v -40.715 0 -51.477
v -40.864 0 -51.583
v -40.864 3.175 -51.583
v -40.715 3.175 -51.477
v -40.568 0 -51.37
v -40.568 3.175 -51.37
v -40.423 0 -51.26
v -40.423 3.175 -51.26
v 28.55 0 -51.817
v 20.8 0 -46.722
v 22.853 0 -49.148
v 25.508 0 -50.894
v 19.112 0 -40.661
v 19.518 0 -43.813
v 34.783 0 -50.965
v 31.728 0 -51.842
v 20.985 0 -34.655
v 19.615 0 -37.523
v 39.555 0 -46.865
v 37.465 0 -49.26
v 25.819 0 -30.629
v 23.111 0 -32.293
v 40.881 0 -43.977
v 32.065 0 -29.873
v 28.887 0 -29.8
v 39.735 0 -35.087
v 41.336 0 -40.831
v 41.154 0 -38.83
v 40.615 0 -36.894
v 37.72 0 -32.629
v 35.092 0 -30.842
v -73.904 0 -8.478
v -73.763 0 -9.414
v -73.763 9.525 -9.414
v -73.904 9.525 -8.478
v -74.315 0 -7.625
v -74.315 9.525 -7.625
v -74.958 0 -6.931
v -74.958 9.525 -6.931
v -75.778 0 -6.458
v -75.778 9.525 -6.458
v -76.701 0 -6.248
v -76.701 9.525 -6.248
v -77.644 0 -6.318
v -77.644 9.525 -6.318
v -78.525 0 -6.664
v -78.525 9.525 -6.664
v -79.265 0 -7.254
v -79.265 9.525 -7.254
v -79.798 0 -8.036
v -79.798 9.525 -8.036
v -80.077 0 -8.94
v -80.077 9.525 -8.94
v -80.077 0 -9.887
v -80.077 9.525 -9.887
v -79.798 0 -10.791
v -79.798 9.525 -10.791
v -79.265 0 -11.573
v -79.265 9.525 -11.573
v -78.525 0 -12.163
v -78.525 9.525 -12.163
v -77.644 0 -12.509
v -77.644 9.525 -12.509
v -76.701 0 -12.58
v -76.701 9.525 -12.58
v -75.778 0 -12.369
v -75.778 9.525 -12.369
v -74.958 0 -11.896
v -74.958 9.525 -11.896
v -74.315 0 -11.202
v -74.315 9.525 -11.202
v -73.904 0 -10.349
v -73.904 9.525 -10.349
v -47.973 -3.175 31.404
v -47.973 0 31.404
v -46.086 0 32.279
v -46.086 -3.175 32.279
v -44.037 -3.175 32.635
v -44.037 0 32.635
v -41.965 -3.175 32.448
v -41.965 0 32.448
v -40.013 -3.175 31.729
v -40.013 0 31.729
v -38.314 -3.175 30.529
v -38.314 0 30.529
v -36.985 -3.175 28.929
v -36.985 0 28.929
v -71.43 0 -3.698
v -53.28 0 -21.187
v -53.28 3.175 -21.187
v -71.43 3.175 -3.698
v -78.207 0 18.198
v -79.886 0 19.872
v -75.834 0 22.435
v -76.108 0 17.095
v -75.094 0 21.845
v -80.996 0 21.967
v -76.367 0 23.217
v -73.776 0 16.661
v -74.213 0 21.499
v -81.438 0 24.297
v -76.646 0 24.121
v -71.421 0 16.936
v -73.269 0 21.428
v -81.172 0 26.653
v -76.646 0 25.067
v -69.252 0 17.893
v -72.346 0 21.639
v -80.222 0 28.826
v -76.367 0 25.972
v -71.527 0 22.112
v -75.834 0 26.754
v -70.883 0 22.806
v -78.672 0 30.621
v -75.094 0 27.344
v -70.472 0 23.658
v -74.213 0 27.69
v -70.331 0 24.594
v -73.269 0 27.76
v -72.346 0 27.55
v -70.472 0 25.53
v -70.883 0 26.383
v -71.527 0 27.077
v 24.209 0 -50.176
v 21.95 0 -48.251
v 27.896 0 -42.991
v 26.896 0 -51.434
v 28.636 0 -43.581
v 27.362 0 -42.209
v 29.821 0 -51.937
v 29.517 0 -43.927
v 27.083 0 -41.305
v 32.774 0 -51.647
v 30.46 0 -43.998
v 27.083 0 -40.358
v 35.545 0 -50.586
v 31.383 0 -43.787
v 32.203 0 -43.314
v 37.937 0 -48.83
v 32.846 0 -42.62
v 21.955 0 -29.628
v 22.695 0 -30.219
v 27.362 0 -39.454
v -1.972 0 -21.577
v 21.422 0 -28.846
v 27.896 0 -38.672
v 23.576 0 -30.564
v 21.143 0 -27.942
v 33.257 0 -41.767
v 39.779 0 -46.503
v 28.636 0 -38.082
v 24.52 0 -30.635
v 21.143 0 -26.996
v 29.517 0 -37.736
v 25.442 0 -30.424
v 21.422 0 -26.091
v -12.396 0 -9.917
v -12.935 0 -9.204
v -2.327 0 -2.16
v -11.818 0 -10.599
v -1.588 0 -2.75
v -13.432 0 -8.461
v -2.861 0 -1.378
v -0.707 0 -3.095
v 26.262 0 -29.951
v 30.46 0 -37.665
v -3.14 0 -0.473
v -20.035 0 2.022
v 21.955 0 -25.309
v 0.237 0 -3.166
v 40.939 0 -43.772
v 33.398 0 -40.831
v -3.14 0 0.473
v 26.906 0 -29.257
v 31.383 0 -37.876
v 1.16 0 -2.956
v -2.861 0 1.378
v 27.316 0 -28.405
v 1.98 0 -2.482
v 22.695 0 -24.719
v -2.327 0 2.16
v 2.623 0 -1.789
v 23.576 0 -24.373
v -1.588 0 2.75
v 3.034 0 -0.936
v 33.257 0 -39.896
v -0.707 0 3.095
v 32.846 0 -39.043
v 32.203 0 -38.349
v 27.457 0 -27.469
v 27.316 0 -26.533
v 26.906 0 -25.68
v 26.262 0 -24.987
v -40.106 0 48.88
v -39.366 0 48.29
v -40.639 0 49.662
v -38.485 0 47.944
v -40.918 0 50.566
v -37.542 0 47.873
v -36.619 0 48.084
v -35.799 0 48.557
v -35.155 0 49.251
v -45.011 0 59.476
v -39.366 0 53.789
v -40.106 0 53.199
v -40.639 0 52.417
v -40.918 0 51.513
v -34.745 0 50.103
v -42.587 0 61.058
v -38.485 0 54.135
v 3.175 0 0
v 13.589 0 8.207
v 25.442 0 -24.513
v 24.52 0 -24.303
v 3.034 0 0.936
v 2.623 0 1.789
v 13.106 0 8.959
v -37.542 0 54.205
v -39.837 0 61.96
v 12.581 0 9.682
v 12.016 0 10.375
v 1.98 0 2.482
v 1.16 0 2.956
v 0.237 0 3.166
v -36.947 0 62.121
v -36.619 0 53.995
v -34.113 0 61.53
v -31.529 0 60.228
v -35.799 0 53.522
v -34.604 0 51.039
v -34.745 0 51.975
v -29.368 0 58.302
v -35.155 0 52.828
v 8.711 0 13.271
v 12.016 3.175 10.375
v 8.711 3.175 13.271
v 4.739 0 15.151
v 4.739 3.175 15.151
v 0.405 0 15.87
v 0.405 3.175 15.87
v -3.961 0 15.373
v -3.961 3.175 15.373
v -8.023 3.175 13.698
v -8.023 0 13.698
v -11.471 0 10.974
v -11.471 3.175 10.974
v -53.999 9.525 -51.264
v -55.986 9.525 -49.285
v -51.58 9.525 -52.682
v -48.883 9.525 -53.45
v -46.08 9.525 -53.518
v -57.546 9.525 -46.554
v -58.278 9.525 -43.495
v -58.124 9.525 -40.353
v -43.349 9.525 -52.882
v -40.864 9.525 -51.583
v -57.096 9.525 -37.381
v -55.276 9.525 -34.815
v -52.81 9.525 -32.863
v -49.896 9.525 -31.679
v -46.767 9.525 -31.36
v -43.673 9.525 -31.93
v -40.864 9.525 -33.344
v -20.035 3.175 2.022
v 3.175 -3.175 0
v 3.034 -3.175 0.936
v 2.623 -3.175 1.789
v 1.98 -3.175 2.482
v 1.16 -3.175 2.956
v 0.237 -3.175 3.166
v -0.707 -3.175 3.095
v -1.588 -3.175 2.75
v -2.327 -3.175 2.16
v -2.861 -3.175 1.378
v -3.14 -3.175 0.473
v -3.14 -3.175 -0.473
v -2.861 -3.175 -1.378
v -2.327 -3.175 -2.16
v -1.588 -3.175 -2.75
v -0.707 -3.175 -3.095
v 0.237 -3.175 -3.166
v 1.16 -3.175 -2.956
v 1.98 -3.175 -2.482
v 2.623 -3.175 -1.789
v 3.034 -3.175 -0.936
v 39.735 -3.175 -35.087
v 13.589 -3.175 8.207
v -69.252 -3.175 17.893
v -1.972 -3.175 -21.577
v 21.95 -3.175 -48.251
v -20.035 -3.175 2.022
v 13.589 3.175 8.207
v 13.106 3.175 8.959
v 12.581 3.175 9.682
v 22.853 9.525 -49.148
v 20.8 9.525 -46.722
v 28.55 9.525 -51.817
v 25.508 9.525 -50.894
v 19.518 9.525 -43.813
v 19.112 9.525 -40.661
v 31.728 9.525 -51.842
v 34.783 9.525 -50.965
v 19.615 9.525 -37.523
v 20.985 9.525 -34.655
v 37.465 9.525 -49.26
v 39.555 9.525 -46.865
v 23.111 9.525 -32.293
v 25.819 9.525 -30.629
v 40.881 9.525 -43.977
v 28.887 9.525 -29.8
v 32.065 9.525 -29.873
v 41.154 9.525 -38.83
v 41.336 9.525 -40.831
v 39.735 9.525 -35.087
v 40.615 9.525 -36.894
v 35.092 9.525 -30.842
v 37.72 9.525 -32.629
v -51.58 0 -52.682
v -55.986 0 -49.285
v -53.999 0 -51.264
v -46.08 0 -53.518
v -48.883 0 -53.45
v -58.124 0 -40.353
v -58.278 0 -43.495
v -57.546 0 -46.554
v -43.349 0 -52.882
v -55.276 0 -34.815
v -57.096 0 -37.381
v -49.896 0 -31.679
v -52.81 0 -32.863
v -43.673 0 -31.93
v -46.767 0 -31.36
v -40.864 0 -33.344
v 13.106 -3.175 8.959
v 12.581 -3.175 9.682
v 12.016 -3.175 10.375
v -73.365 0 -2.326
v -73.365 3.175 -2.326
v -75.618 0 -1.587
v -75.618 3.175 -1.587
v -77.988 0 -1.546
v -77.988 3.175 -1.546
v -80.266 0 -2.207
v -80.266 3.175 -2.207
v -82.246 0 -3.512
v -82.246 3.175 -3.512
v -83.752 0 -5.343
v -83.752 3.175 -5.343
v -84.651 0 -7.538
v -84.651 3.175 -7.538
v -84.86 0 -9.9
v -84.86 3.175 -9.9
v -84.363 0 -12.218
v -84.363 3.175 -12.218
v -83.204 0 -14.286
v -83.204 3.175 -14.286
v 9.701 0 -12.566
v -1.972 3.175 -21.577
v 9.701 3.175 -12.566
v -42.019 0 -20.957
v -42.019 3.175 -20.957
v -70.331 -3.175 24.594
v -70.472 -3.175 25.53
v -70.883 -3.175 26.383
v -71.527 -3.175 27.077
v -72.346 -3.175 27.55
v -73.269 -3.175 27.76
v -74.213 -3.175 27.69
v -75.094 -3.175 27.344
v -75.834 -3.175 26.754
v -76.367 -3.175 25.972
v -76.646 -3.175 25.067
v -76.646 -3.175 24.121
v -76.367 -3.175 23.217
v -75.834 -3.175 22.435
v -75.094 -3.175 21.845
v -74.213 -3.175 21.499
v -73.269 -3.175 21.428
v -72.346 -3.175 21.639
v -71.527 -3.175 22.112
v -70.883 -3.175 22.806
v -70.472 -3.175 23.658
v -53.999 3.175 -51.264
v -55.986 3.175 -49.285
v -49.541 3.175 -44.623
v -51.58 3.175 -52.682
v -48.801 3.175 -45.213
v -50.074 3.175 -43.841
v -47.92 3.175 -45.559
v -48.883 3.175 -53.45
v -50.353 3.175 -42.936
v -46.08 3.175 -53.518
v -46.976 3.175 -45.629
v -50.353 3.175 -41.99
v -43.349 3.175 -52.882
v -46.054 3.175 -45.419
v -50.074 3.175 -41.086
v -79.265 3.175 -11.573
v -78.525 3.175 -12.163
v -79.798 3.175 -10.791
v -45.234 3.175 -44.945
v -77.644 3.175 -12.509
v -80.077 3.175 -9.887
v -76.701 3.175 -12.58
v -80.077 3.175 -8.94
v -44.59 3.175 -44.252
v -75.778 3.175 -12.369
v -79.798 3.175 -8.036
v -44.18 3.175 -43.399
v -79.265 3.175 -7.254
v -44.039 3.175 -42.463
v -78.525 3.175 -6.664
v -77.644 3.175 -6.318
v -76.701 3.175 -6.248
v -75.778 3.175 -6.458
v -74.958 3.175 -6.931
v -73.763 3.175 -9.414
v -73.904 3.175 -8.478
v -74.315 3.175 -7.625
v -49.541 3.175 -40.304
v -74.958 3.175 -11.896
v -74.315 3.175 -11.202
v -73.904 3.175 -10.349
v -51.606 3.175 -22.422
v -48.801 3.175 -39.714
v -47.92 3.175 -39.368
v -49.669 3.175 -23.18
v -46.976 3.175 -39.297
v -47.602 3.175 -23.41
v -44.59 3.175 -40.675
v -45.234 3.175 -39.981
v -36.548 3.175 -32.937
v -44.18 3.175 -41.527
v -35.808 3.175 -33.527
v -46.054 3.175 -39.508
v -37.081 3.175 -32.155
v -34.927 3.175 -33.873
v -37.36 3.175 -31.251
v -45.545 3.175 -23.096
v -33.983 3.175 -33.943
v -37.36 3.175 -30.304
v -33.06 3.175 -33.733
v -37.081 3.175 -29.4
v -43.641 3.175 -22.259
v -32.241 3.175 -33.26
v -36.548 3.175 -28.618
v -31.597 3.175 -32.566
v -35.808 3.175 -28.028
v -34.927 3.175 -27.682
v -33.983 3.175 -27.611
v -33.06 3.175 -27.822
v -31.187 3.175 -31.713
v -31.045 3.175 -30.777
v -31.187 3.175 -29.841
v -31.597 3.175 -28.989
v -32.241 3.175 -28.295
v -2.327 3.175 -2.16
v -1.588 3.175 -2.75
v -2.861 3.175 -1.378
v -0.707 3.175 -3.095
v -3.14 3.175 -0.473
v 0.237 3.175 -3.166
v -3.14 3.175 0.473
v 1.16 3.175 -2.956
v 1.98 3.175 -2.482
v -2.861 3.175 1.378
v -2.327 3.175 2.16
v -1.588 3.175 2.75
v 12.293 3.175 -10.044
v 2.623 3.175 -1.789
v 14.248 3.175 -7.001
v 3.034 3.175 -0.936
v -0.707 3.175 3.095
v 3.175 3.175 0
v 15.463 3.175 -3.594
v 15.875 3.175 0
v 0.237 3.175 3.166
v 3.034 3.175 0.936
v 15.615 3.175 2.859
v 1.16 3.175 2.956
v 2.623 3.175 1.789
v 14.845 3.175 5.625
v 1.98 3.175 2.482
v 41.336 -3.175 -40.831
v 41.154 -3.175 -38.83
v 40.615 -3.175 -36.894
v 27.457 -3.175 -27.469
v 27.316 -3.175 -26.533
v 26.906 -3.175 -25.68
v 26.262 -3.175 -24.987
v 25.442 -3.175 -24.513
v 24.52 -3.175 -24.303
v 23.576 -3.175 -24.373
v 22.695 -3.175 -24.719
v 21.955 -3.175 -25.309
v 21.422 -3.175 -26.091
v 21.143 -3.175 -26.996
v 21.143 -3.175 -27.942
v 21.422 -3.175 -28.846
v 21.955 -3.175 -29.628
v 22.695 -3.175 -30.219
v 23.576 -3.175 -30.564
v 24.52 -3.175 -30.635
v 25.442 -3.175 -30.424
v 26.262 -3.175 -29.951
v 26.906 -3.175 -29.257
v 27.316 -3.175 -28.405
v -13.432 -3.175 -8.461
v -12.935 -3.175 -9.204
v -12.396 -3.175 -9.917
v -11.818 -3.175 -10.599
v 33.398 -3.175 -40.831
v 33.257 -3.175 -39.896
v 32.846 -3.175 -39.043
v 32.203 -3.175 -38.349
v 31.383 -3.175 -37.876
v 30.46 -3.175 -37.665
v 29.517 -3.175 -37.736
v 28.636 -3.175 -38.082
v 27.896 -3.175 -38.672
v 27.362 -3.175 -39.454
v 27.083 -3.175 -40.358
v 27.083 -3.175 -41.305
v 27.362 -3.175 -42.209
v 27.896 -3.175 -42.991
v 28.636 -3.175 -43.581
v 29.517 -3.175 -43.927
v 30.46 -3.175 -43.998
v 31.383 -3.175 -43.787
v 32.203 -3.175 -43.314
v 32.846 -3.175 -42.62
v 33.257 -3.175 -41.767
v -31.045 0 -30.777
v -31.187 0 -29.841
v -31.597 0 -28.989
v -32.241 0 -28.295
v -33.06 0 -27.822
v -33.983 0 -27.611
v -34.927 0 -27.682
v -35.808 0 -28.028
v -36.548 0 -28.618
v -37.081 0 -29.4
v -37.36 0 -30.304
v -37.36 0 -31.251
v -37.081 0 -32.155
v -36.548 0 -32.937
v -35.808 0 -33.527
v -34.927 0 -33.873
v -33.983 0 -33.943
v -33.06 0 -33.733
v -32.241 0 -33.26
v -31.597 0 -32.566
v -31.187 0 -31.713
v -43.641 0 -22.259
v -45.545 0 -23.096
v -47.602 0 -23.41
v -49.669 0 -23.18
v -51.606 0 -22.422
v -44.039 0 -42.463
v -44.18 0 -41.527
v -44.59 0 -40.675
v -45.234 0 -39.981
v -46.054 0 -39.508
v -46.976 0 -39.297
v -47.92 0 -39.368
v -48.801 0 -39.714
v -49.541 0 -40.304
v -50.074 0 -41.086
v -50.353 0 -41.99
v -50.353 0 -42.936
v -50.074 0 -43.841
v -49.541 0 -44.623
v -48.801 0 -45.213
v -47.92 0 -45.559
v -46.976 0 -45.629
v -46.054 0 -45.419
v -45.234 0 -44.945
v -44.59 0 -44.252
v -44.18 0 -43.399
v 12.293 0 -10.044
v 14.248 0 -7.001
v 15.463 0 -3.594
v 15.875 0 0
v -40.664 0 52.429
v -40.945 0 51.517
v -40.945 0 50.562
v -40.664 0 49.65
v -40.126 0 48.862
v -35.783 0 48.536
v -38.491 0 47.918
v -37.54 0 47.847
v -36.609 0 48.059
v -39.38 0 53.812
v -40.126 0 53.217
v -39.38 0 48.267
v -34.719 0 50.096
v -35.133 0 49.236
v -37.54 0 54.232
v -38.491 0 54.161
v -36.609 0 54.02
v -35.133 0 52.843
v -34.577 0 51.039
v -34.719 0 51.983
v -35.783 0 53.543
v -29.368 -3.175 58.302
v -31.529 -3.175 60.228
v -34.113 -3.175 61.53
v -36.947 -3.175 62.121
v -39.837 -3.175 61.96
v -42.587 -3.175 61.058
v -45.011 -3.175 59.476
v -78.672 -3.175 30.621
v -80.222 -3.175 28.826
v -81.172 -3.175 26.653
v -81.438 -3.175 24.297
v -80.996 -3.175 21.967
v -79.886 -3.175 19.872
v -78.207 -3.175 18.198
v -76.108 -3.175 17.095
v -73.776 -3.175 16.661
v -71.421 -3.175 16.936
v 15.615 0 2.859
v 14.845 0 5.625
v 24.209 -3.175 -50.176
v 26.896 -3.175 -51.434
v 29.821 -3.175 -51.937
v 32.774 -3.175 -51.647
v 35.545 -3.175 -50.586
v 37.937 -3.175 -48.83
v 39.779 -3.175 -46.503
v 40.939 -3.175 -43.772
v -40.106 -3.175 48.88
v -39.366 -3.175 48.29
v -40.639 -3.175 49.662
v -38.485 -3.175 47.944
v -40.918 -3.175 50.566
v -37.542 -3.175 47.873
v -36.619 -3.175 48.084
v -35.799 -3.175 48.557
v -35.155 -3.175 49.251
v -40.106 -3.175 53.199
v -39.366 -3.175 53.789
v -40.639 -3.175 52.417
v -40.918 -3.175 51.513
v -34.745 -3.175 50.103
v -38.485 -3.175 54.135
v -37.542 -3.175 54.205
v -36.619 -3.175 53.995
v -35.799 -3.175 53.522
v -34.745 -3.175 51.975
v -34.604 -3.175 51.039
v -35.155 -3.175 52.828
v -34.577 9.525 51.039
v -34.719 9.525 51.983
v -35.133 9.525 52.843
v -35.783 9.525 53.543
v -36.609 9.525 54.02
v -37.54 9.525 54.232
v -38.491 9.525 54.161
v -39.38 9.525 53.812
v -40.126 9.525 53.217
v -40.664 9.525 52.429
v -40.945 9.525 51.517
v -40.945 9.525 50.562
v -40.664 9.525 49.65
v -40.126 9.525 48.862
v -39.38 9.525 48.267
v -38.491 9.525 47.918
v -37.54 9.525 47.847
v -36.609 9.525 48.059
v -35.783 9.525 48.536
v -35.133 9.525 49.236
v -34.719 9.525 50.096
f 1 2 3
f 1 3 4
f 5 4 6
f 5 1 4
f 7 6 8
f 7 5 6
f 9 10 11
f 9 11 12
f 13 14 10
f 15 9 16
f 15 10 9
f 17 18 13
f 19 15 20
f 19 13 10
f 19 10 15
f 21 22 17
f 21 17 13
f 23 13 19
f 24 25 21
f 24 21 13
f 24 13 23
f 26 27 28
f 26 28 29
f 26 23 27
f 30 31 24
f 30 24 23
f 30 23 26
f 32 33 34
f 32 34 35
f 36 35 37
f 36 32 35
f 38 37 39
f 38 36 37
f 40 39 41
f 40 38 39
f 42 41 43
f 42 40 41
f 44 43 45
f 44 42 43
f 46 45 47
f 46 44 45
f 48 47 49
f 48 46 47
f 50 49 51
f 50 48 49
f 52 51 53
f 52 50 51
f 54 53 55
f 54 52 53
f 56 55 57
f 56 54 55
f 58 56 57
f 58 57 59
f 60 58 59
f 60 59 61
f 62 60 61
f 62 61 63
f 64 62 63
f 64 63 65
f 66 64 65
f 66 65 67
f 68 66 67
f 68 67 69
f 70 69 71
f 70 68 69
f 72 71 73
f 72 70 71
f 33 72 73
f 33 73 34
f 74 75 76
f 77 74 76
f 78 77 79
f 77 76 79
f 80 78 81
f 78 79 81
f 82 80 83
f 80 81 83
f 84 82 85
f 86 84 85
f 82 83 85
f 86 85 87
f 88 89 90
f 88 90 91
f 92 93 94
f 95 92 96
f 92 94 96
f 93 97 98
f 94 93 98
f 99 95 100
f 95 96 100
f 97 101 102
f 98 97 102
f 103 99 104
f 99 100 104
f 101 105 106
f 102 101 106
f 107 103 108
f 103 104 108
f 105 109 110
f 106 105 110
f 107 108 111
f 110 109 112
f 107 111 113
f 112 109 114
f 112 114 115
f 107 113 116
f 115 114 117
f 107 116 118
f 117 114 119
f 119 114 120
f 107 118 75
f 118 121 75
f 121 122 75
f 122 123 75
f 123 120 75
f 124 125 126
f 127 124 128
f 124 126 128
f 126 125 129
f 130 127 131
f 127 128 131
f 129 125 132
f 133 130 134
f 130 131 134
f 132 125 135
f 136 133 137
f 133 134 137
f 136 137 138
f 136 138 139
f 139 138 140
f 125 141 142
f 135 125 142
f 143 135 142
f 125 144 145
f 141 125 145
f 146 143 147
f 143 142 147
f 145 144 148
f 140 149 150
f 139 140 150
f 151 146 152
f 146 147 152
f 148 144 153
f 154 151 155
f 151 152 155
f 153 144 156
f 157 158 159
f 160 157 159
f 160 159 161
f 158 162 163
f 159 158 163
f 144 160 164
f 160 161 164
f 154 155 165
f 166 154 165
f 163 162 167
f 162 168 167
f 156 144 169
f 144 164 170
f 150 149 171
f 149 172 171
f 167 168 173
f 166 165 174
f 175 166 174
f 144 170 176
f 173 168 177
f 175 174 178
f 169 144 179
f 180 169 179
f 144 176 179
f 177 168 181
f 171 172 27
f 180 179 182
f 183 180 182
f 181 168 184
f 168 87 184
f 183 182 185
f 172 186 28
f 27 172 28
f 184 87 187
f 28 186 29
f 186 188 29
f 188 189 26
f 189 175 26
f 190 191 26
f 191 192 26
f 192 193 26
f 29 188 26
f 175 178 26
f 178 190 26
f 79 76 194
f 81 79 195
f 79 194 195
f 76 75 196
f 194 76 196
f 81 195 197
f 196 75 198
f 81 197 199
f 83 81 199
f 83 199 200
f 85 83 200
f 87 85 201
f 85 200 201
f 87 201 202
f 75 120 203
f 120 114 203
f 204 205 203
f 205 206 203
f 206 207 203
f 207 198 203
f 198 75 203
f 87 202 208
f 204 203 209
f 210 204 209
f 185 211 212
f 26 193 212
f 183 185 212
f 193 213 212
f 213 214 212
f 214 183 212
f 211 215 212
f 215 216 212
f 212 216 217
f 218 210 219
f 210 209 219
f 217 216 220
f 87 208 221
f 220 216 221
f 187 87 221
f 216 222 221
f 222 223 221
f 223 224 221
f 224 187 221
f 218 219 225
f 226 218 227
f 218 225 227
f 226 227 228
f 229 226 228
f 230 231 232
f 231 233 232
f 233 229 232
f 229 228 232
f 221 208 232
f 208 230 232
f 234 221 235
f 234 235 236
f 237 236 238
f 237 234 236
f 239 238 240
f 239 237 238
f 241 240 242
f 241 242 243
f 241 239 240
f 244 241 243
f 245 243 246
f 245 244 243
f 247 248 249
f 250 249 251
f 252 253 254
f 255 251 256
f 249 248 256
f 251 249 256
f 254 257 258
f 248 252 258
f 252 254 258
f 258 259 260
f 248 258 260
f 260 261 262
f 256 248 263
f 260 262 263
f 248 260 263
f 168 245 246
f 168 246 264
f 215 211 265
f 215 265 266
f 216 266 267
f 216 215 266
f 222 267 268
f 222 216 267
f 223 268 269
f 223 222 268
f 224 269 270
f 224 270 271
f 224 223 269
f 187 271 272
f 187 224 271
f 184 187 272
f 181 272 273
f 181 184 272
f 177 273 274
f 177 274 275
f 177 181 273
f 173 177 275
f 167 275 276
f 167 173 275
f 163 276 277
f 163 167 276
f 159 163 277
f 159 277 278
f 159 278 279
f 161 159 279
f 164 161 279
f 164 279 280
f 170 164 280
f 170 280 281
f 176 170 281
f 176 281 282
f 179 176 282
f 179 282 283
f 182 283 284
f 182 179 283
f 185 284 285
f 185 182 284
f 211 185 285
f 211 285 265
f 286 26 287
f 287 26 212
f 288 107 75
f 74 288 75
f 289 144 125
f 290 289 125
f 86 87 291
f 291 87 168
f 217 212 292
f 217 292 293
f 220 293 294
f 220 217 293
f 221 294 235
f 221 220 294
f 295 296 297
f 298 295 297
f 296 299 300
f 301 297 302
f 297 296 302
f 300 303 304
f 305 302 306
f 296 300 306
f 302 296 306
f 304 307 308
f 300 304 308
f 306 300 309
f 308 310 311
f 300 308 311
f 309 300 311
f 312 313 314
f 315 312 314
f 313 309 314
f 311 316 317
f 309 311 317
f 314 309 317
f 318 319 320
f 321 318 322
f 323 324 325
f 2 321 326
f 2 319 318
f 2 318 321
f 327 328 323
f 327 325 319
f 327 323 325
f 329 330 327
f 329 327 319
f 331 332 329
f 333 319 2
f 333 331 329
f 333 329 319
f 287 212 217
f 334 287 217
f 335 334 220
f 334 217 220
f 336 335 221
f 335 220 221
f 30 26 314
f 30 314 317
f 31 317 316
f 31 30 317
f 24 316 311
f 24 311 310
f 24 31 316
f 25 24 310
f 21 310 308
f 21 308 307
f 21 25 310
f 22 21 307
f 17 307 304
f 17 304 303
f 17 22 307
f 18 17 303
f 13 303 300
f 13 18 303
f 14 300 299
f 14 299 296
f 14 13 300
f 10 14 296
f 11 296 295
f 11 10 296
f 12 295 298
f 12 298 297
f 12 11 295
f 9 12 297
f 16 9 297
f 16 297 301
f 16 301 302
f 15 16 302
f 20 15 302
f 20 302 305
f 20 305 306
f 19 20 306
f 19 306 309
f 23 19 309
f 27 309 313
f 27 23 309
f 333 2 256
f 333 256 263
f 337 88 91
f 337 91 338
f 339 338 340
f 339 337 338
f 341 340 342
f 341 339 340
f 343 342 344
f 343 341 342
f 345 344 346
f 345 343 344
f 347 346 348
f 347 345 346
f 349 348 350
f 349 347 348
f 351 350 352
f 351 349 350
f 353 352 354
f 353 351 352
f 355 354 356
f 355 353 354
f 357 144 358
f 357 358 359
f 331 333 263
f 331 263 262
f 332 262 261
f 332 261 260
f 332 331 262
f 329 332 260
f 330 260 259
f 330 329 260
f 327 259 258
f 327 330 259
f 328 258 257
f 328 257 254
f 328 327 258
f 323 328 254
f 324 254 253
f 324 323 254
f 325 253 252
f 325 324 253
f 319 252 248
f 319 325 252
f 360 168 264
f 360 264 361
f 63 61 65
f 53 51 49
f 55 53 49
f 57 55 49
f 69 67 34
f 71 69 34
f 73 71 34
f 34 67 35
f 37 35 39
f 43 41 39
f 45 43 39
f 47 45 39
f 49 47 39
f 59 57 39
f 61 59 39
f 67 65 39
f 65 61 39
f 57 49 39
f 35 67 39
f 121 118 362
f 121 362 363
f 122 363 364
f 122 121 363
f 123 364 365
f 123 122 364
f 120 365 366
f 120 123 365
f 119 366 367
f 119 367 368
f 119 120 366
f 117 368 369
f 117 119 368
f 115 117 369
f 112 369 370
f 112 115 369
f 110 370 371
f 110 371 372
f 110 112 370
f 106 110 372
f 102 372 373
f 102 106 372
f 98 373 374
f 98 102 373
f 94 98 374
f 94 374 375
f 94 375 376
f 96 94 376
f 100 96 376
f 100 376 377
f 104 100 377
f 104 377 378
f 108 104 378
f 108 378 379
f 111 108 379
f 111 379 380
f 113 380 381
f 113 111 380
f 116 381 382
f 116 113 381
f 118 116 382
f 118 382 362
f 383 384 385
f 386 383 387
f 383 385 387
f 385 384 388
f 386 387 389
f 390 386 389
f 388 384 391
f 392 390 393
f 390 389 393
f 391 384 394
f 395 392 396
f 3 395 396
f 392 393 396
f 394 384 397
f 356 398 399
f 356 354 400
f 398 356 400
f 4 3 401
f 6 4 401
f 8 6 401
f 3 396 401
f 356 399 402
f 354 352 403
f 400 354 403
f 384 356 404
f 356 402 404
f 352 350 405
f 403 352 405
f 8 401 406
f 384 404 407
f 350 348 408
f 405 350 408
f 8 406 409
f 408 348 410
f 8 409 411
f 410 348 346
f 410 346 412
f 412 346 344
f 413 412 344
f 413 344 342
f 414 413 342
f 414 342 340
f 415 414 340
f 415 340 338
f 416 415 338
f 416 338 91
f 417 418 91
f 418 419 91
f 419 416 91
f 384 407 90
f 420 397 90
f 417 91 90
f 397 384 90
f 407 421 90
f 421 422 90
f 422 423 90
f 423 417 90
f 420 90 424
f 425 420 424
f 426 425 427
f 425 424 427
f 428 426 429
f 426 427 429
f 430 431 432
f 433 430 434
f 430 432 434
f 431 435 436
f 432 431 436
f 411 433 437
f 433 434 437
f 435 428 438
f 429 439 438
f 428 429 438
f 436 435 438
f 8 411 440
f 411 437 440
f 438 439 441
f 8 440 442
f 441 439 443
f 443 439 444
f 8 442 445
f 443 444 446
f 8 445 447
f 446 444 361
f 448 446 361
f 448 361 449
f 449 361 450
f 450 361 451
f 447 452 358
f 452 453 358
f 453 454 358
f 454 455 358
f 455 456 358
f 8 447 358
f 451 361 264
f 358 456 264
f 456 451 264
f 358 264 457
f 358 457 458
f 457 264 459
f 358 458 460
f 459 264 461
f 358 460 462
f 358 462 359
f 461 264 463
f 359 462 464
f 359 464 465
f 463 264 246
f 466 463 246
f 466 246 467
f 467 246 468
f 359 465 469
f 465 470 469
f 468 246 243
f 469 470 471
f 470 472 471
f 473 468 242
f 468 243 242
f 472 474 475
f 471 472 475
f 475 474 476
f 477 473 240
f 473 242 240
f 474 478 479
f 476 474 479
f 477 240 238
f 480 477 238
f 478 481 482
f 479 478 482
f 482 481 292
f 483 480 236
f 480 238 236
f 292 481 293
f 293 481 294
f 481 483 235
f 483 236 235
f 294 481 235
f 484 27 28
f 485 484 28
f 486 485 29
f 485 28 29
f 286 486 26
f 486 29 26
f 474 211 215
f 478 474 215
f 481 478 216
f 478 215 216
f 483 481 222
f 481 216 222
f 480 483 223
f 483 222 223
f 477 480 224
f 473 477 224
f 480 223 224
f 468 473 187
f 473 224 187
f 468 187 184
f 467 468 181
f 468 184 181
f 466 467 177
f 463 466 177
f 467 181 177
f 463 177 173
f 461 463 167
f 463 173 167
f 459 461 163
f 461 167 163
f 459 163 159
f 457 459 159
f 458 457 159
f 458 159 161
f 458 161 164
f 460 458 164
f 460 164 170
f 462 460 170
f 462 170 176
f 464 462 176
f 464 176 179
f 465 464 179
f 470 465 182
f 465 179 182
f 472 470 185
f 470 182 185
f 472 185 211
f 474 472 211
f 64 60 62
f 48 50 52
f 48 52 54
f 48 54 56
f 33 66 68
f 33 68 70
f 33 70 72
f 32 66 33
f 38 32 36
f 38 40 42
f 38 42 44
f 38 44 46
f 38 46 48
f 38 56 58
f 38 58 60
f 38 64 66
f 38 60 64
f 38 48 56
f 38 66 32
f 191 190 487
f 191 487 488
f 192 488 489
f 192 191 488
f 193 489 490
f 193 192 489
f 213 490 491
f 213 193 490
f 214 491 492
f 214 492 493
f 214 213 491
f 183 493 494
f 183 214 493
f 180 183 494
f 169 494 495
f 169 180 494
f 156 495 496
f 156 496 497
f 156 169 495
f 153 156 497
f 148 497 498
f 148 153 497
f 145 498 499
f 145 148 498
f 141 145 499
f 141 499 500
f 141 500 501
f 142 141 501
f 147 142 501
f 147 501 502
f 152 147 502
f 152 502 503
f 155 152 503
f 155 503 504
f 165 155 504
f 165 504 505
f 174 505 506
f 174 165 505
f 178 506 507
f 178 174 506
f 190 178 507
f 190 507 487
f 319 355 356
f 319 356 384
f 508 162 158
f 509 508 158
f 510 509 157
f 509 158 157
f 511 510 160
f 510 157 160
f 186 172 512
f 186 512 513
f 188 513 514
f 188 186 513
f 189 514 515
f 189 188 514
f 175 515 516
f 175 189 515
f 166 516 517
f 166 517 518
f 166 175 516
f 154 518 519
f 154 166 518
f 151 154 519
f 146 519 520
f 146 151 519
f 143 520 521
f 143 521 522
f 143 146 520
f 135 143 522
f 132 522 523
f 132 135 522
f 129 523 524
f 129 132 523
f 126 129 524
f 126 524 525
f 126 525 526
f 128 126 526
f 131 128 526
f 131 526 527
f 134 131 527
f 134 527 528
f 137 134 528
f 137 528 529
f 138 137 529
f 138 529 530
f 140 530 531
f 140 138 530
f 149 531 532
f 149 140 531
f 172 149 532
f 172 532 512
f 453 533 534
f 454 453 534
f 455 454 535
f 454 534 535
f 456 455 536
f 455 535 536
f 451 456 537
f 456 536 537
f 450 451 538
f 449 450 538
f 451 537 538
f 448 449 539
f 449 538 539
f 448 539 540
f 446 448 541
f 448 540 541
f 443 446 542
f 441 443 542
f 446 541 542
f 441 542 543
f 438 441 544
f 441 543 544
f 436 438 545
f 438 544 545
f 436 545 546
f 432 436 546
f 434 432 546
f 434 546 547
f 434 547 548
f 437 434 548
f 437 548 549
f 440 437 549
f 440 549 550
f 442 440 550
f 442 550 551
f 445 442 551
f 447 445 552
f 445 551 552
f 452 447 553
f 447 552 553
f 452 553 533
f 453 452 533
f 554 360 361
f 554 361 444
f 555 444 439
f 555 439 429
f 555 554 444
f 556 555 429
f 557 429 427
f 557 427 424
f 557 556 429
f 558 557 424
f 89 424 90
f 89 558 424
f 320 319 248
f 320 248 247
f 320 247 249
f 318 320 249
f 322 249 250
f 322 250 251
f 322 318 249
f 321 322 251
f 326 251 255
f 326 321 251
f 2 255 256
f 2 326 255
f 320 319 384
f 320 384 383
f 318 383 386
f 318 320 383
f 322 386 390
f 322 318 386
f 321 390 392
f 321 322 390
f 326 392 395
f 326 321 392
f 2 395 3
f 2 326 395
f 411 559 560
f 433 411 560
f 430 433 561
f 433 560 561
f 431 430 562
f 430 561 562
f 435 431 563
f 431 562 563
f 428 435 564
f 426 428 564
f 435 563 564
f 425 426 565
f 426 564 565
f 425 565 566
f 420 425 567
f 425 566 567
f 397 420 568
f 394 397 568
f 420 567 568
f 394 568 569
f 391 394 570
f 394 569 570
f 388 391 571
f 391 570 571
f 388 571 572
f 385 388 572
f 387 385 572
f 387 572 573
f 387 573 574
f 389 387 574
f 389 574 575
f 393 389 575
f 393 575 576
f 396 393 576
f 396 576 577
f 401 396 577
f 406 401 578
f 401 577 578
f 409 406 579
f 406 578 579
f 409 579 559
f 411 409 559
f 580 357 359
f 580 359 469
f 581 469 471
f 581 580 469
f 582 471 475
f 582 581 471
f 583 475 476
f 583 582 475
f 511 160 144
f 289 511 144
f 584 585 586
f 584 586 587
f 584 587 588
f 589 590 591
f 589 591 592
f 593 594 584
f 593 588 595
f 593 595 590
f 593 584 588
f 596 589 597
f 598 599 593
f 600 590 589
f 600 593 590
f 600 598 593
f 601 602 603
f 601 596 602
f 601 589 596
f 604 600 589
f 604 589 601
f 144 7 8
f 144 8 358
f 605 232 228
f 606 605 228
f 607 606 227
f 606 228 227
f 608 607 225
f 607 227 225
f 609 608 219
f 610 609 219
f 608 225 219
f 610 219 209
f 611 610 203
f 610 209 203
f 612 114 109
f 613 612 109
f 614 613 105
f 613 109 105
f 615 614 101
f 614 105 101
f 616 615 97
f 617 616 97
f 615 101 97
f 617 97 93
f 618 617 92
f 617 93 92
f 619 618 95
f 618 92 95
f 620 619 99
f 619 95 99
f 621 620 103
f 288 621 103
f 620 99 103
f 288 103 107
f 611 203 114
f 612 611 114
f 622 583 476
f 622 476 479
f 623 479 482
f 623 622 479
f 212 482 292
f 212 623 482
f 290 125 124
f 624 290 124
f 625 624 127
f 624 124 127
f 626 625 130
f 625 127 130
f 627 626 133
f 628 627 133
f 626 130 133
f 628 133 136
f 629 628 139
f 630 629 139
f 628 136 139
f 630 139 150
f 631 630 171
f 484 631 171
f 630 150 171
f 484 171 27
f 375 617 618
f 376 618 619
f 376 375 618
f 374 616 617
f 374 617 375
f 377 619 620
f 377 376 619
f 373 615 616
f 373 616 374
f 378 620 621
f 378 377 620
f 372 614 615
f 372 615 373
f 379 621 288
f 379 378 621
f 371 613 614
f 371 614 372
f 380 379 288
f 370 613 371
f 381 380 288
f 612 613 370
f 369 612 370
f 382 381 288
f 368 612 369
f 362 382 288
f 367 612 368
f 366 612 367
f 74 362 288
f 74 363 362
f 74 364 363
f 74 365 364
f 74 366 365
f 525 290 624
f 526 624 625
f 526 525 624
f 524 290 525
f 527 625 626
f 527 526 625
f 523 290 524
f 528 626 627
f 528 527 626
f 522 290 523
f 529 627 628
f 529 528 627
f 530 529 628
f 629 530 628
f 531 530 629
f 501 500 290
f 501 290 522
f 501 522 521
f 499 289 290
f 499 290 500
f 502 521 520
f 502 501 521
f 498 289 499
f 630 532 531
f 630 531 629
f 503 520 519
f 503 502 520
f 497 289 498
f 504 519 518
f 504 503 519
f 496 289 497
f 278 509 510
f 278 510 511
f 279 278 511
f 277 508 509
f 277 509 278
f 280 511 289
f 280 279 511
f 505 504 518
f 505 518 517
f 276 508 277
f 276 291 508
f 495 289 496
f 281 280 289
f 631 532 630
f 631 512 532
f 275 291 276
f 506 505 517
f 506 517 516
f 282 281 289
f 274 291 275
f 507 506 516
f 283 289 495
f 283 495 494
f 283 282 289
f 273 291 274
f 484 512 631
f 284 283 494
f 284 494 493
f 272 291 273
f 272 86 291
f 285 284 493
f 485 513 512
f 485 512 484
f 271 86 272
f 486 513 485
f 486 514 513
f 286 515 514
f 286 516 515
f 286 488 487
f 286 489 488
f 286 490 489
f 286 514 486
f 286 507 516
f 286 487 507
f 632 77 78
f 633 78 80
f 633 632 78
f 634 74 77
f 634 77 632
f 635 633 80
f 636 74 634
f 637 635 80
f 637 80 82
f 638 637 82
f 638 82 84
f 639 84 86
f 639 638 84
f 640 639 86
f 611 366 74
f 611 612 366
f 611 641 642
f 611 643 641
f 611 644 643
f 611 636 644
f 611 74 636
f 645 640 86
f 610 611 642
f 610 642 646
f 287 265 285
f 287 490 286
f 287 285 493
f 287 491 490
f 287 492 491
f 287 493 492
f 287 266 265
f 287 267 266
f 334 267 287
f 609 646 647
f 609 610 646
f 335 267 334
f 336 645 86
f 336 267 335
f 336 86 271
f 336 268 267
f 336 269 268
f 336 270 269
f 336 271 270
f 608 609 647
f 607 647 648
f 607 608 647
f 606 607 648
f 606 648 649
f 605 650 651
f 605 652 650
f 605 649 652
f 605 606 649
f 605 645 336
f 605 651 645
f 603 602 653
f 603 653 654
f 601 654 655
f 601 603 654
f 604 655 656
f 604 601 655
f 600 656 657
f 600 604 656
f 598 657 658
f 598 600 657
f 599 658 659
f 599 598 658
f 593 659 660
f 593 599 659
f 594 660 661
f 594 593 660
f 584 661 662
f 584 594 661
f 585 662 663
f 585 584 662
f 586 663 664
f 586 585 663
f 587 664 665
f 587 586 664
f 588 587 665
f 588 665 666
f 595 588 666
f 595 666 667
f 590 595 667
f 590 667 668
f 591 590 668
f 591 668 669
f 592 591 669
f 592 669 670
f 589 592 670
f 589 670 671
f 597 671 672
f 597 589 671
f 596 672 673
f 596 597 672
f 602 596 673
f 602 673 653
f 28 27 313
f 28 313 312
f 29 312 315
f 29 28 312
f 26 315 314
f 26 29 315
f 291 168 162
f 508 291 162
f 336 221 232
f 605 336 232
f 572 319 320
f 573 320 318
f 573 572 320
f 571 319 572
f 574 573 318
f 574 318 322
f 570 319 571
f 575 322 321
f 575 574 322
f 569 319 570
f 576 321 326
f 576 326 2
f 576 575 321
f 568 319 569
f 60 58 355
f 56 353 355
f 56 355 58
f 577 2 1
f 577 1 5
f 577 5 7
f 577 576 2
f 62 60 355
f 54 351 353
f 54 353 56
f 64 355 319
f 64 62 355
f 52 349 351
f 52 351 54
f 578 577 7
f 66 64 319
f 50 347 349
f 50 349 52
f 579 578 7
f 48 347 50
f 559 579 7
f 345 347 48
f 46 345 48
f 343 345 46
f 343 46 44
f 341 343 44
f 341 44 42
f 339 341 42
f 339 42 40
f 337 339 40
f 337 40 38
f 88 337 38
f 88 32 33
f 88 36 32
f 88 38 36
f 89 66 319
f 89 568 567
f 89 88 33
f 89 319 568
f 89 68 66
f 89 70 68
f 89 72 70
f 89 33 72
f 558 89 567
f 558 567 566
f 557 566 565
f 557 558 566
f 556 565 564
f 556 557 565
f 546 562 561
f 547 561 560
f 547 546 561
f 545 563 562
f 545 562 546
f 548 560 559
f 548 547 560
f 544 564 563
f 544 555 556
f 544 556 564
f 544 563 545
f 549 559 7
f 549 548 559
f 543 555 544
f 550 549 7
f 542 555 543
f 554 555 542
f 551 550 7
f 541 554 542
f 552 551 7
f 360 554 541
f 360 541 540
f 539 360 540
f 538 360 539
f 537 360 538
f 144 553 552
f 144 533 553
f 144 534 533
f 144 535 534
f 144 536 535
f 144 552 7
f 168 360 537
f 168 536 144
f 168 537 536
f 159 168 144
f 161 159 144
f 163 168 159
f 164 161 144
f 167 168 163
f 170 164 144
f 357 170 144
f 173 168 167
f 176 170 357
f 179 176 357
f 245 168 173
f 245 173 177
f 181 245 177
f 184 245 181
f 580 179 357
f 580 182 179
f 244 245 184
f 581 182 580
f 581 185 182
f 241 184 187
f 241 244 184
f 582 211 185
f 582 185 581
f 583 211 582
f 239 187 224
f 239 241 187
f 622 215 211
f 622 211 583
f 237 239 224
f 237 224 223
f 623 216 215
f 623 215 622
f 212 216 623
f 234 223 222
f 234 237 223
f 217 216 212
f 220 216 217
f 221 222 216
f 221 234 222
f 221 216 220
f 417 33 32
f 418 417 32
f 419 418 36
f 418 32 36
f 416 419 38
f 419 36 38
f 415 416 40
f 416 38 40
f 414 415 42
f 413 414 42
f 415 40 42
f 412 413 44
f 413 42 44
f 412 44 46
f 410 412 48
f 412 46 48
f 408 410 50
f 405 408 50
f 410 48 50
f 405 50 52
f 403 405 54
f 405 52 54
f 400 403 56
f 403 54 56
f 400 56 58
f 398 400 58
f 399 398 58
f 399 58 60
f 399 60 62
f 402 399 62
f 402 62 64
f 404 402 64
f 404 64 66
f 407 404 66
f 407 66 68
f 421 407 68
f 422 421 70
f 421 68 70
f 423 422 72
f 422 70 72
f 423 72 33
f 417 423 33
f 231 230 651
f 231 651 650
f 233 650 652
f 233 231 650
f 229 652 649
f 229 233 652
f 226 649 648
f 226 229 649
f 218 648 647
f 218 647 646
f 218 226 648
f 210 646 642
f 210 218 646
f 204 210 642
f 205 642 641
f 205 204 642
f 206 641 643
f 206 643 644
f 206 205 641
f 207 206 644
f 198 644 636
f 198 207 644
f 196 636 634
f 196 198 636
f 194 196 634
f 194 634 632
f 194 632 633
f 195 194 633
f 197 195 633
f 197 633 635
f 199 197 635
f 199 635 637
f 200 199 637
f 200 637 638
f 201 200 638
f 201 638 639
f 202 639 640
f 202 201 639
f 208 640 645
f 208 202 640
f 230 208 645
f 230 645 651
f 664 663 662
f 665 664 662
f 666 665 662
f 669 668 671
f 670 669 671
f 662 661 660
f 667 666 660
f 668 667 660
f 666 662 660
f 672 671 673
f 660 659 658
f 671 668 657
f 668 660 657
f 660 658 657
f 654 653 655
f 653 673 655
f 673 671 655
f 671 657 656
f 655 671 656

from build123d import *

# Parameters (mm, degrees)
F0_R     = 3.175
F1_DEPTH = 3.175
F2_DEPTH = 3.175
F3_DEPTH = 3.175
F6_DEPTH = 9.525
F5_R     = 3.2017905818
F7_DEPTH = 9.525


with BuildPart() as f1:
    # F0 (on Front) → F1 (new body)
    with BuildSketch(Plane.XZ):
        with BuildLine():
            ThreePointArc((9.7006393072, -12.5663527737), (14.2480397599, -7.0006419705), (15.875, 0))
            ThreePointArc((15.875, 0), (15.2928451858, 4.2596374402), (13.589077339, 8.2068631081))
            ThreePointArc((13.589077339, 8.2068631081), (12.8481306417, 9.3242245797), (12.0155447944, 10.3750811223))
            ThreePointArc((12.0155447944, 10.3750811223), (0.4046753915, 15.8698412981), (-11.4711511247, 10.9739836374))
            ThreePointArc((-11.4711511247, 10.9739836374), (-15.7947937715, 1.5937737343), (-13.4322489239, -8.461105947))
            ThreePointArc((-13.4322489239, -8.461105947), (-12.6704088261, -9.5643277432), (-11.818197177, -10.5993320773))
            ThreePointArc((-11.818197177, -10.5993320773), (-1.4450970341, -15.8090897765), (9.7006393072, -12.5663527737))
        make_face()
        Circle(F0_R, mode=Mode.SUBTRACT)
        with BuildLine():
            Line((-1.9723715397, -21.5773737034), (9.7006393072, -12.5663527737))
            ThreePointArc((9.7006393072, -12.5663527737), (-1.4450970341, -15.8090897765), (-11.818197177, -10.5993320773))
            Line((-11.818197177, -10.5993320773), (-1.9723715397, -21.5773737034))
        make_face()
        with BuildLine():
            Line((-1.9723715397, -21.5773737034), (-11.818197177, -10.5993320773))
            ThreePointArc((-11.818197177, -10.5993320773), (-12.6704088261, -9.5643277432), (-13.4322489239, -8.461105947))
            Line((-13.4322489239, -8.461105947), (-20.0354577926, 2.0216779558))
            Line((-20.0354577926, 2.0216779558), (-42.0186206254, -20.9574143581))
            ThreePointArc((-42.0186206254, -20.9574143581), (-47.601548398, -23.4101962273), (-53.2796810271, -21.1866784606))
            Line((-53.2796810271, -21.1866784606), (-71.4303764219, -3.6977333553))
            ThreePointArc((-71.4303764219, -3.6977333553), (-69.6330912018, -6.308131344), (-69.0003723469, -9.4136230398))
            ThreePointArc((-69.0003723469, -9.4136230398), (-74.3620830362, -16.921566545), (-83.2036392891, -14.2864118589))
            Line((-83.2036392891, -14.2864118589), (-55.9857223186, -49.2850811473))
            ThreePointArc((-55.9857223186, -49.2850811473), (-55.2758223722, -34.8153662876), (-40.8636484691, -33.3436837668))
            ThreePointArc((-40.8636484691, -33.3436837668), (-37.3634700126, -37.3190890389), (-36.1011484691, -42.4631769682))
            ThreePointArc((-36.1011484691, -42.4631769682), (-37.2400206372, -47.3636263476), (-40.4232009541, -51.2596239098))
            Line((-40.4232009541, -51.2596239098), (-1.9723715397, -21.5773737034))
        make_face()
        with Locations((-34.2204524104, -30.7773106666)):
            Circle(F0_R, mode=Mode.SUBTRACT)
        with BuildLine():
            ThreePointArc((-13.4322489239, -8.461105947), (-15.7947937715, 1.5937737343), (-11.4711511247, 10.9739836374))
            Line((-11.4711511247, 10.9739836374), (-20.0354577926, 2.0216779558))
            Line((-20.0354577926, 2.0216779558), (-13.4322489239, -8.461105947))
        make_face()
        with BuildLine():
            ThreePointArc((-55.9857223186, -49.2850811473), (-48.882881605, -53.4495920791), (-40.8636484691, -51.5826701696))
            Line((-40.8636484691, -51.5826701696), (-40.8636484691, -33.3436837668))
            ThreePointArc((-40.8636484691, -33.3436837668), (-55.2758223722, -34.8153662876), (-55.9857223186, -49.2850811473))
        make_face()
        with Locations((-47.2136484691, -42.4631769682)):
            Circle(F0_R, mode=Mode.SUBTRACT)
        with BuildLine():
            ThreePointArc((-71.4303764219, -3.6977333553), (-82.2457694679, -3.5119169812), (-83.2036392891, -14.2864118589))
            ThreePointArc((-83.2036392891, -14.2864118589), (-74.3620830362, -16.921566545), (-69.0003723469, -9.4136230398))
            ThreePointArc((-69.0003723469, -9.4136230398), (-69.6330912018, -6.308131344), (-71.4303764219, -3.6977333553))
        make_face()
        with Locations((-76.9378723469, -9.4136230398)):
            Circle(F0_R, mode=Mode.SUBTRACT)
    extrude(amount=-F1_DEPTH)

    # F0 (on Front) → F3 (join)
    with BuildSketch(Plane.XZ):
        with BuildLine():
            ThreePointArc((-40.8636484691, -51.5826701696), (-40.64143956, -51.4238536338), (-40.4232009541, -51.2596239098))
            ThreePointArc((-40.4232009541, -51.2596239098), (-37.2400206372, -47.3636263476), (-36.1011484691, -42.4631769682))
            ThreePointArc((-36.1011484691, -42.4631769682), (-37.3634700126, -37.3190890389), (-40.8636484691, -33.3436837668))
            Line((-40.8636484691, -33.3436837668), (-40.8636484691, -51.5826701696))
        make_face()
    extrude(amount=-F3_DEPTH)


with BuildPart() as f2:
    # F0 (on Front) → F2 (new body)
    with BuildSketch(Plane.XZ):
        with BuildLine():
            ThreePointArc((9.7006393072, -12.5663527737), (14.2480397599, -7.0006419705), (15.875, 0))
            ThreePointArc((15.875, 0), (15.2928451858, 4.2596374402), (13.589077339, 8.2068631081))
            ThreePointArc((13.589077339, 8.2068631081), (12.8481306417, 9.3242245797), (12.0155447944, 10.3750811223))
            ThreePointArc((12.0155447944, 10.3750811223), (0.4046753915, 15.8698412981), (-11.4711511247, 10.9739836374))
            ThreePointArc((-11.4711511247, 10.9739836374), (-15.7947937715, 1.5937737343), (-13.4322489239, -8.461105947))
            ThreePointArc((-13.4322489239, -8.461105947), (-12.6704088261, -9.5643277432), (-11.818197177, -10.5993320773))
            ThreePointArc((-11.818197177, -10.5993320773), (-1.4450970341, -15.8090897765), (9.7006393072, -12.5663527737))
        make_face()
        Circle(F0_R, mode=Mode.SUBTRACT)
        with BuildLine():
            ThreePointArc((13.589077339, 8.2068631081), (15.2928451858, 4.2596374402), (15.875, 0))
            ThreePointArc((15.875, 0), (14.2480397599, -7.0006419705), (9.7006393072, -12.5663527737))
            Line((9.7006393072, -12.5663527737), (-1.9723715397, -21.5773737034))
            Line((-1.9723715397, -21.5773737034), (21.9502834065, -48.2510028613))
            ThreePointArc((21.9502834065, -48.2510028613), (23.6117354925, -31.8995862557), (39.7353755677, -35.0866662316))
            Line((39.7353755677, -35.0866662316), (13.589077339, 8.2068631081))
        make_face()
        with Locations((24.2823193089, -27.4688883834)):
            Circle(F0_R, mode=Mode.SUBTRACT)
        with BuildLine():
            Line((-1.9723715397, -21.5773737034), (9.7006393072, -12.5663527737))
            ThreePointArc((9.7006393072, -12.5663527737), (-1.4450970341, -15.8090897765), (-11.818197177, -10.5993320773))
            Line((-11.818197177, -10.5993320773), (-1.9723715397, -21.5773737034))
        make_face()
        with BuildLine():
            ThreePointArc((-11.4711511247, 10.9739836374), (0.4046753915, 15.8698412981), (12.0155447944, 10.3750811223))
            Line((12.0155447944, 10.3750811223), (-29.3678954319, 58.3018947947))
            ThreePointArc((-29.3678954319, 58.3018947947), (-27.3635577476, 54.9137242302), (-26.666276788, 51.0393380091))
            ThreePointArc((-26.666276788, 51.0393380091), (-42.4219285212, 40.9433586989), (-45.0111673585, 59.4761728946))
            Line((-45.0111673585, 59.4761728946), (-78.6723066589, 30.62050489))
            ThreePointArc((-78.6723066589, 30.62050489), (-70.189776442, 31.8056080505), (-65.5688133943, 24.5941942575))
            ThreePointArc((-65.5688133943, 24.5941942575), (-66.5502150866, 20.7710276925), (-69.2517368799, 17.8932626108))
            Line((-69.2517368799, 17.8932626108), (-47.9730600876, 31.4035867439))
            ThreePointArc((-47.9730600876, 31.4035867439), (-41.9651841532, 32.4479277656), (-36.9848059896, 28.9292554649))
            Line((-36.9848059896, 28.9292554649), (-20.0354577926, 2.0216779558))
            Line((-20.0354577926, 2.0216779558), (-11.4711511247, 10.9739836374))
        make_face()
        with BuildLine():
            ThreePointArc((41.3355214304, -40.8314704072), (40.9280130605, -37.8497241991), (39.7353755677, -35.0866662316))
            ThreePointArc((39.7353755677, -35.0866662316), (23.6117354925, -31.8995862557), (21.9502834065, -48.2510028613))
            ThreePointArc((21.9502834065, -48.2510028613), (34.1952283081, -51.2097760864), (41.3355214304, -40.8314704072))
        make_face()
        with Locations((30.2230214304, -40.8314704072)):
            Circle(F0_R, mode=Mode.SUBTRACT)
        with BuildLine():
            ThreePointArc((-13.4322489239, -8.461105947), (-15.7947937715, 1.5937737343), (-11.4711511247, 10.9739836374))
            Line((-11.4711511247, 10.9739836374), (-20.0354577926, 2.0216779558))
            Line((-20.0354577926, 2.0216779558), (-13.4322489239, -8.461105947))
        make_face()
        with BuildLine():
            ThreePointArc((-26.666276788, 51.0393380091), (-27.3635577476, 54.9137242302), (-29.3678954319, 58.3018947947))
            ThreePointArc((-29.3678954319, 58.3018947947), (-36.9469460378, 62.1206607574), (-45.0111673585, 59.4761728946))
            ThreePointArc((-45.0111673585, 59.4761728946), (-42.4219285212, 40.9433586989), (-26.666276788, 51.0393380091))
        make_face()
        with Locations((-37.778776788, 51.0393380091)):
            Circle(F0_R, mode=Mode.SUBTRACT)
        with BuildLine():
            ThreePointArc((-65.5688133943, 24.5941942575), (-70.189776442, 31.8056080505), (-78.6723066589, 30.62050489))
            ThreePointArc((-78.6723066589, 30.62050489), (-79.8862306455, 19.871847159), (-69.2517368799, 17.8932626108))
            ThreePointArc((-69.2517368799, 17.8932626108), (-66.5502150866, 20.7710276925), (-65.5688133943, 24.5941942575))
        make_face()
        with Locations((-73.5063133943, 24.5941942575)):
            Circle(F0_R, mode=Mode.SUBTRACT)
    extrude(amount=F2_DEPTH)


with BuildPart() as f6:
    # F0 (on Front) → F6 (new body, through all)
    with BuildSketch(Plane.XZ):
        with BuildLine():
            ThreePointArc((41.3355214304, -40.8314704072), (40.9280130605, -37.8497241991), (39.7353755677, -35.0866662316))
            ThreePointArc((39.7353755677, -35.0866662316), (23.6117354925, -31.8995862557), (21.9502834065, -48.2510028613))
            ThreePointArc((21.9502834065, -48.2510028613), (34.1952283081, -51.2097760864), (41.3355214304, -40.8314704072))
        make_face()
        with Locations((30.2230214304, -40.8314704072)):
            Circle(F0_R, mode=Mode.SUBTRACT)
        with Locations((30.2230214304, -40.8314704072)):
            Circle(F0_R)
    extrude(amount=-F6_DEPTH)


with BuildPart() as f6b:
    # F0 (on Front) → F6, piece 2 (new body, through all)
    with BuildSketch(Plane.XZ):
        with BuildLine():
            ThreePointArc((-55.9857223186, -49.2850811473), (-48.882881605, -53.4495920791), (-40.8636484691, -51.5826701696))
            Line((-40.8636484691, -51.5826701696), (-40.8636484691, -33.3436837668))
            ThreePointArc((-40.8636484691, -33.3436837668), (-55.2758223722, -34.8153662876), (-55.9857223186, -49.2850811473))
        make_face()
        with Locations((-47.2136484691, -42.4631769682)):
            Circle(F0_R, mode=Mode.SUBTRACT)
        with Locations((-47.2136484691, -42.4631769682)):
            Circle(F0_R)
    extrude(amount=-F6_DEPTH)


with BuildPart() as f6c:
    # F5 (on Front) → F6, piece 3 (new body, through all)
    with BuildSketch(Plane.XZ):
        with Locations((-37.7789363265, 51.0394647717)):
            Circle(F5_R)
    extrude(amount=-F6_DEPTH)


with BuildPart() as f7:
    # F0 (on Front) → F7 (new body, through all)
    with BuildSketch(Plane.XZ):
        with Locations((-76.9378723469, -9.4136230398)):
            Circle(F0_R)
    extrude(amount=-F7_DEPTH)


solid = Compound([f1.part, f2.part, f6.part, f6b.part, f6c.part, f7.part])
